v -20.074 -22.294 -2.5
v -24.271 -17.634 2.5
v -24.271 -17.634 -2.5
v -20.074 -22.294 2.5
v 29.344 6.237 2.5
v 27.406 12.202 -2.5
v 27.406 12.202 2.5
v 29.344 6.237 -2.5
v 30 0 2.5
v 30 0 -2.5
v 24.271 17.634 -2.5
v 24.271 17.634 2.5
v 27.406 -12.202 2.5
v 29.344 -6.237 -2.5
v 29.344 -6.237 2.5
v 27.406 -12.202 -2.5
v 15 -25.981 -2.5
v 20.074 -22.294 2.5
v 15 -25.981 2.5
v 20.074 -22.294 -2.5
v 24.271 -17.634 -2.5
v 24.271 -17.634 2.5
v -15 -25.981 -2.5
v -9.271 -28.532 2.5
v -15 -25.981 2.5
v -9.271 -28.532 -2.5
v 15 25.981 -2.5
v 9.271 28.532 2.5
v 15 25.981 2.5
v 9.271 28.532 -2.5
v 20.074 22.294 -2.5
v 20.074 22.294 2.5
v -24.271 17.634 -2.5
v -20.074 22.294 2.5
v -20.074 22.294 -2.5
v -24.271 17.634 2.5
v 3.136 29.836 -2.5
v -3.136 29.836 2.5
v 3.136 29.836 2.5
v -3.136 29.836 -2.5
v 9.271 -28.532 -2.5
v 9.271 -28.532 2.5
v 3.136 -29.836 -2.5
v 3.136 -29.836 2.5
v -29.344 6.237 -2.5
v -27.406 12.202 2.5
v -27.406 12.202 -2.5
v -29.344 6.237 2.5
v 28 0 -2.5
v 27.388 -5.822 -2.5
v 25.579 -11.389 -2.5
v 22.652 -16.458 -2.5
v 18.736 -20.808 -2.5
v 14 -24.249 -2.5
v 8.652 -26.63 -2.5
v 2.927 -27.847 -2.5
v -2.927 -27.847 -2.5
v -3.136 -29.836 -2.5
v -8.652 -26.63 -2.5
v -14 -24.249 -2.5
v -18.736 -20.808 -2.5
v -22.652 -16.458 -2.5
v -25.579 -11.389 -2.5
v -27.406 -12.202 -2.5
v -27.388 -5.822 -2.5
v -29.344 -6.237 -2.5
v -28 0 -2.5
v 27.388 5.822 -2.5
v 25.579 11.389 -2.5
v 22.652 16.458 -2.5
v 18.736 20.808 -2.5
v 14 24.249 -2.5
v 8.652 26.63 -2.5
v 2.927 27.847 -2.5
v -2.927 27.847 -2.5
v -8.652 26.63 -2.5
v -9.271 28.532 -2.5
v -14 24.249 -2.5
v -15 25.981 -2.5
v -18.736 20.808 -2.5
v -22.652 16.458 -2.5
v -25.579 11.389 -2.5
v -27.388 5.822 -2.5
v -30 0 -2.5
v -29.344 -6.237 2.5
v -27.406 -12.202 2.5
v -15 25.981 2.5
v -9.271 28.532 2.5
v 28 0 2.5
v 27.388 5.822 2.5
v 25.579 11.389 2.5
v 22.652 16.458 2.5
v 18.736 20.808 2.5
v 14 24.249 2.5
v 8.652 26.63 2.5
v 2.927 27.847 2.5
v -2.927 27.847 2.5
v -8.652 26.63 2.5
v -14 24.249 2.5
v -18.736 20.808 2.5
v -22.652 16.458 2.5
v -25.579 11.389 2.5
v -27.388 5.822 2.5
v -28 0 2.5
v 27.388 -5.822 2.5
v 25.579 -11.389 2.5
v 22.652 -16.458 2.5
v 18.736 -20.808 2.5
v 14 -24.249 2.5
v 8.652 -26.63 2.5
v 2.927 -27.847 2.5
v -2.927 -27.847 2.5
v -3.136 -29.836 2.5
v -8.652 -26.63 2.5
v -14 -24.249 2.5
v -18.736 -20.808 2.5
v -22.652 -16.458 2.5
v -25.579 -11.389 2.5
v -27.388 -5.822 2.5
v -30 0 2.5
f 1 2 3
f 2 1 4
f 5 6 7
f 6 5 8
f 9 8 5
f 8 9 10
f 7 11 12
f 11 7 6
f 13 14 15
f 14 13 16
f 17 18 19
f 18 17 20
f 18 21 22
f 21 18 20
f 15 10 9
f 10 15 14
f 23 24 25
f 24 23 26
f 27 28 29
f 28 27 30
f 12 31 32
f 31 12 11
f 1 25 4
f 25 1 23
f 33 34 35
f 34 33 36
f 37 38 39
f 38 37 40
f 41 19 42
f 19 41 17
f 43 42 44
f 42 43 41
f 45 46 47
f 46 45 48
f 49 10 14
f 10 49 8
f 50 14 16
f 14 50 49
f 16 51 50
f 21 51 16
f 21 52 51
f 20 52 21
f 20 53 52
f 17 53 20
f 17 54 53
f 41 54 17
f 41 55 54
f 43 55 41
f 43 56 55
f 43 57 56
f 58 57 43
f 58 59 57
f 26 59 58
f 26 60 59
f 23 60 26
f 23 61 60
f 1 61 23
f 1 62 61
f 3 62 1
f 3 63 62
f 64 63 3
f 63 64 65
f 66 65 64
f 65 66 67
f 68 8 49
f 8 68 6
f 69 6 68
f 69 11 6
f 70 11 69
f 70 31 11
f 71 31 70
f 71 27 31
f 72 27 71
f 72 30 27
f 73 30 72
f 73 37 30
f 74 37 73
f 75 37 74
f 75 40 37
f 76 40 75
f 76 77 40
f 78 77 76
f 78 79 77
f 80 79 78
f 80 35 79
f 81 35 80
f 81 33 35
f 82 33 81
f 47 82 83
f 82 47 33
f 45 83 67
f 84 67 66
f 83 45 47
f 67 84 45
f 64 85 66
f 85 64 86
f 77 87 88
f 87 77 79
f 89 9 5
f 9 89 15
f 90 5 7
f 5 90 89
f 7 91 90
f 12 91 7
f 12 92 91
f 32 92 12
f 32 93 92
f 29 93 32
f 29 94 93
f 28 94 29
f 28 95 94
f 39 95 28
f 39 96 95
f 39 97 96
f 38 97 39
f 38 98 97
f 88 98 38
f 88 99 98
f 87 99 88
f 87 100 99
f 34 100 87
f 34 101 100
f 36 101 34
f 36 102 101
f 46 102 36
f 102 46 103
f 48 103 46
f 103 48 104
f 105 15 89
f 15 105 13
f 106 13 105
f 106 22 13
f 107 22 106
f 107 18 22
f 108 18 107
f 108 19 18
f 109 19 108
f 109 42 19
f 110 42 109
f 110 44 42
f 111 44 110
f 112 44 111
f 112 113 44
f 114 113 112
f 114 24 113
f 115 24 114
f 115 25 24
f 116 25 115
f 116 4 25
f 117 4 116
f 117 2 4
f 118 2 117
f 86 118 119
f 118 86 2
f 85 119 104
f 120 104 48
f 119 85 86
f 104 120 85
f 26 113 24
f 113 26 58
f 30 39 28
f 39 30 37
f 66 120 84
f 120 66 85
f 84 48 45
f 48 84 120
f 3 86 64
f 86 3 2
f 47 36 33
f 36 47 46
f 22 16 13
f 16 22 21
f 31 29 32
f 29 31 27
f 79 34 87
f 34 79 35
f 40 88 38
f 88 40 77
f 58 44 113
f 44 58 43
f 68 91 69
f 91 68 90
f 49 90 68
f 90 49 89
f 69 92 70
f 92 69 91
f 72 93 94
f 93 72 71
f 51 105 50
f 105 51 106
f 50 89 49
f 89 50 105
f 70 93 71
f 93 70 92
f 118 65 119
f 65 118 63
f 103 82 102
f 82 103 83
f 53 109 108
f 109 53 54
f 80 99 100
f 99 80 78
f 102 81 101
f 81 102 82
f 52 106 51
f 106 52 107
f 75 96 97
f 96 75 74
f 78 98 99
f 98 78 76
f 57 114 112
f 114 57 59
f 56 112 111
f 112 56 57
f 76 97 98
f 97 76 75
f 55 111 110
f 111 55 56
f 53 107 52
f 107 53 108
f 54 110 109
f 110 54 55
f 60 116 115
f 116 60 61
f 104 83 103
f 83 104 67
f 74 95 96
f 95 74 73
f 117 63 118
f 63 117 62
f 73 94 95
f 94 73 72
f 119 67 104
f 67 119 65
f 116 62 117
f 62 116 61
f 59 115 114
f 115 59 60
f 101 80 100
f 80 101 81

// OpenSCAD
//
//   Code generated by ChatGPT for the query below
//
//   Can you write me OpenSCAD code to create a model of a dinner plate?
//
//   Created Jan 2023 by Jenny List, for a Hackaday article.
//


module dinner_plate() {
  difference() {
    cylinder(r=30, h=5, center=true);
    cylinder(r=28, h=5, center=true);
  }
}

dinner_plate();
